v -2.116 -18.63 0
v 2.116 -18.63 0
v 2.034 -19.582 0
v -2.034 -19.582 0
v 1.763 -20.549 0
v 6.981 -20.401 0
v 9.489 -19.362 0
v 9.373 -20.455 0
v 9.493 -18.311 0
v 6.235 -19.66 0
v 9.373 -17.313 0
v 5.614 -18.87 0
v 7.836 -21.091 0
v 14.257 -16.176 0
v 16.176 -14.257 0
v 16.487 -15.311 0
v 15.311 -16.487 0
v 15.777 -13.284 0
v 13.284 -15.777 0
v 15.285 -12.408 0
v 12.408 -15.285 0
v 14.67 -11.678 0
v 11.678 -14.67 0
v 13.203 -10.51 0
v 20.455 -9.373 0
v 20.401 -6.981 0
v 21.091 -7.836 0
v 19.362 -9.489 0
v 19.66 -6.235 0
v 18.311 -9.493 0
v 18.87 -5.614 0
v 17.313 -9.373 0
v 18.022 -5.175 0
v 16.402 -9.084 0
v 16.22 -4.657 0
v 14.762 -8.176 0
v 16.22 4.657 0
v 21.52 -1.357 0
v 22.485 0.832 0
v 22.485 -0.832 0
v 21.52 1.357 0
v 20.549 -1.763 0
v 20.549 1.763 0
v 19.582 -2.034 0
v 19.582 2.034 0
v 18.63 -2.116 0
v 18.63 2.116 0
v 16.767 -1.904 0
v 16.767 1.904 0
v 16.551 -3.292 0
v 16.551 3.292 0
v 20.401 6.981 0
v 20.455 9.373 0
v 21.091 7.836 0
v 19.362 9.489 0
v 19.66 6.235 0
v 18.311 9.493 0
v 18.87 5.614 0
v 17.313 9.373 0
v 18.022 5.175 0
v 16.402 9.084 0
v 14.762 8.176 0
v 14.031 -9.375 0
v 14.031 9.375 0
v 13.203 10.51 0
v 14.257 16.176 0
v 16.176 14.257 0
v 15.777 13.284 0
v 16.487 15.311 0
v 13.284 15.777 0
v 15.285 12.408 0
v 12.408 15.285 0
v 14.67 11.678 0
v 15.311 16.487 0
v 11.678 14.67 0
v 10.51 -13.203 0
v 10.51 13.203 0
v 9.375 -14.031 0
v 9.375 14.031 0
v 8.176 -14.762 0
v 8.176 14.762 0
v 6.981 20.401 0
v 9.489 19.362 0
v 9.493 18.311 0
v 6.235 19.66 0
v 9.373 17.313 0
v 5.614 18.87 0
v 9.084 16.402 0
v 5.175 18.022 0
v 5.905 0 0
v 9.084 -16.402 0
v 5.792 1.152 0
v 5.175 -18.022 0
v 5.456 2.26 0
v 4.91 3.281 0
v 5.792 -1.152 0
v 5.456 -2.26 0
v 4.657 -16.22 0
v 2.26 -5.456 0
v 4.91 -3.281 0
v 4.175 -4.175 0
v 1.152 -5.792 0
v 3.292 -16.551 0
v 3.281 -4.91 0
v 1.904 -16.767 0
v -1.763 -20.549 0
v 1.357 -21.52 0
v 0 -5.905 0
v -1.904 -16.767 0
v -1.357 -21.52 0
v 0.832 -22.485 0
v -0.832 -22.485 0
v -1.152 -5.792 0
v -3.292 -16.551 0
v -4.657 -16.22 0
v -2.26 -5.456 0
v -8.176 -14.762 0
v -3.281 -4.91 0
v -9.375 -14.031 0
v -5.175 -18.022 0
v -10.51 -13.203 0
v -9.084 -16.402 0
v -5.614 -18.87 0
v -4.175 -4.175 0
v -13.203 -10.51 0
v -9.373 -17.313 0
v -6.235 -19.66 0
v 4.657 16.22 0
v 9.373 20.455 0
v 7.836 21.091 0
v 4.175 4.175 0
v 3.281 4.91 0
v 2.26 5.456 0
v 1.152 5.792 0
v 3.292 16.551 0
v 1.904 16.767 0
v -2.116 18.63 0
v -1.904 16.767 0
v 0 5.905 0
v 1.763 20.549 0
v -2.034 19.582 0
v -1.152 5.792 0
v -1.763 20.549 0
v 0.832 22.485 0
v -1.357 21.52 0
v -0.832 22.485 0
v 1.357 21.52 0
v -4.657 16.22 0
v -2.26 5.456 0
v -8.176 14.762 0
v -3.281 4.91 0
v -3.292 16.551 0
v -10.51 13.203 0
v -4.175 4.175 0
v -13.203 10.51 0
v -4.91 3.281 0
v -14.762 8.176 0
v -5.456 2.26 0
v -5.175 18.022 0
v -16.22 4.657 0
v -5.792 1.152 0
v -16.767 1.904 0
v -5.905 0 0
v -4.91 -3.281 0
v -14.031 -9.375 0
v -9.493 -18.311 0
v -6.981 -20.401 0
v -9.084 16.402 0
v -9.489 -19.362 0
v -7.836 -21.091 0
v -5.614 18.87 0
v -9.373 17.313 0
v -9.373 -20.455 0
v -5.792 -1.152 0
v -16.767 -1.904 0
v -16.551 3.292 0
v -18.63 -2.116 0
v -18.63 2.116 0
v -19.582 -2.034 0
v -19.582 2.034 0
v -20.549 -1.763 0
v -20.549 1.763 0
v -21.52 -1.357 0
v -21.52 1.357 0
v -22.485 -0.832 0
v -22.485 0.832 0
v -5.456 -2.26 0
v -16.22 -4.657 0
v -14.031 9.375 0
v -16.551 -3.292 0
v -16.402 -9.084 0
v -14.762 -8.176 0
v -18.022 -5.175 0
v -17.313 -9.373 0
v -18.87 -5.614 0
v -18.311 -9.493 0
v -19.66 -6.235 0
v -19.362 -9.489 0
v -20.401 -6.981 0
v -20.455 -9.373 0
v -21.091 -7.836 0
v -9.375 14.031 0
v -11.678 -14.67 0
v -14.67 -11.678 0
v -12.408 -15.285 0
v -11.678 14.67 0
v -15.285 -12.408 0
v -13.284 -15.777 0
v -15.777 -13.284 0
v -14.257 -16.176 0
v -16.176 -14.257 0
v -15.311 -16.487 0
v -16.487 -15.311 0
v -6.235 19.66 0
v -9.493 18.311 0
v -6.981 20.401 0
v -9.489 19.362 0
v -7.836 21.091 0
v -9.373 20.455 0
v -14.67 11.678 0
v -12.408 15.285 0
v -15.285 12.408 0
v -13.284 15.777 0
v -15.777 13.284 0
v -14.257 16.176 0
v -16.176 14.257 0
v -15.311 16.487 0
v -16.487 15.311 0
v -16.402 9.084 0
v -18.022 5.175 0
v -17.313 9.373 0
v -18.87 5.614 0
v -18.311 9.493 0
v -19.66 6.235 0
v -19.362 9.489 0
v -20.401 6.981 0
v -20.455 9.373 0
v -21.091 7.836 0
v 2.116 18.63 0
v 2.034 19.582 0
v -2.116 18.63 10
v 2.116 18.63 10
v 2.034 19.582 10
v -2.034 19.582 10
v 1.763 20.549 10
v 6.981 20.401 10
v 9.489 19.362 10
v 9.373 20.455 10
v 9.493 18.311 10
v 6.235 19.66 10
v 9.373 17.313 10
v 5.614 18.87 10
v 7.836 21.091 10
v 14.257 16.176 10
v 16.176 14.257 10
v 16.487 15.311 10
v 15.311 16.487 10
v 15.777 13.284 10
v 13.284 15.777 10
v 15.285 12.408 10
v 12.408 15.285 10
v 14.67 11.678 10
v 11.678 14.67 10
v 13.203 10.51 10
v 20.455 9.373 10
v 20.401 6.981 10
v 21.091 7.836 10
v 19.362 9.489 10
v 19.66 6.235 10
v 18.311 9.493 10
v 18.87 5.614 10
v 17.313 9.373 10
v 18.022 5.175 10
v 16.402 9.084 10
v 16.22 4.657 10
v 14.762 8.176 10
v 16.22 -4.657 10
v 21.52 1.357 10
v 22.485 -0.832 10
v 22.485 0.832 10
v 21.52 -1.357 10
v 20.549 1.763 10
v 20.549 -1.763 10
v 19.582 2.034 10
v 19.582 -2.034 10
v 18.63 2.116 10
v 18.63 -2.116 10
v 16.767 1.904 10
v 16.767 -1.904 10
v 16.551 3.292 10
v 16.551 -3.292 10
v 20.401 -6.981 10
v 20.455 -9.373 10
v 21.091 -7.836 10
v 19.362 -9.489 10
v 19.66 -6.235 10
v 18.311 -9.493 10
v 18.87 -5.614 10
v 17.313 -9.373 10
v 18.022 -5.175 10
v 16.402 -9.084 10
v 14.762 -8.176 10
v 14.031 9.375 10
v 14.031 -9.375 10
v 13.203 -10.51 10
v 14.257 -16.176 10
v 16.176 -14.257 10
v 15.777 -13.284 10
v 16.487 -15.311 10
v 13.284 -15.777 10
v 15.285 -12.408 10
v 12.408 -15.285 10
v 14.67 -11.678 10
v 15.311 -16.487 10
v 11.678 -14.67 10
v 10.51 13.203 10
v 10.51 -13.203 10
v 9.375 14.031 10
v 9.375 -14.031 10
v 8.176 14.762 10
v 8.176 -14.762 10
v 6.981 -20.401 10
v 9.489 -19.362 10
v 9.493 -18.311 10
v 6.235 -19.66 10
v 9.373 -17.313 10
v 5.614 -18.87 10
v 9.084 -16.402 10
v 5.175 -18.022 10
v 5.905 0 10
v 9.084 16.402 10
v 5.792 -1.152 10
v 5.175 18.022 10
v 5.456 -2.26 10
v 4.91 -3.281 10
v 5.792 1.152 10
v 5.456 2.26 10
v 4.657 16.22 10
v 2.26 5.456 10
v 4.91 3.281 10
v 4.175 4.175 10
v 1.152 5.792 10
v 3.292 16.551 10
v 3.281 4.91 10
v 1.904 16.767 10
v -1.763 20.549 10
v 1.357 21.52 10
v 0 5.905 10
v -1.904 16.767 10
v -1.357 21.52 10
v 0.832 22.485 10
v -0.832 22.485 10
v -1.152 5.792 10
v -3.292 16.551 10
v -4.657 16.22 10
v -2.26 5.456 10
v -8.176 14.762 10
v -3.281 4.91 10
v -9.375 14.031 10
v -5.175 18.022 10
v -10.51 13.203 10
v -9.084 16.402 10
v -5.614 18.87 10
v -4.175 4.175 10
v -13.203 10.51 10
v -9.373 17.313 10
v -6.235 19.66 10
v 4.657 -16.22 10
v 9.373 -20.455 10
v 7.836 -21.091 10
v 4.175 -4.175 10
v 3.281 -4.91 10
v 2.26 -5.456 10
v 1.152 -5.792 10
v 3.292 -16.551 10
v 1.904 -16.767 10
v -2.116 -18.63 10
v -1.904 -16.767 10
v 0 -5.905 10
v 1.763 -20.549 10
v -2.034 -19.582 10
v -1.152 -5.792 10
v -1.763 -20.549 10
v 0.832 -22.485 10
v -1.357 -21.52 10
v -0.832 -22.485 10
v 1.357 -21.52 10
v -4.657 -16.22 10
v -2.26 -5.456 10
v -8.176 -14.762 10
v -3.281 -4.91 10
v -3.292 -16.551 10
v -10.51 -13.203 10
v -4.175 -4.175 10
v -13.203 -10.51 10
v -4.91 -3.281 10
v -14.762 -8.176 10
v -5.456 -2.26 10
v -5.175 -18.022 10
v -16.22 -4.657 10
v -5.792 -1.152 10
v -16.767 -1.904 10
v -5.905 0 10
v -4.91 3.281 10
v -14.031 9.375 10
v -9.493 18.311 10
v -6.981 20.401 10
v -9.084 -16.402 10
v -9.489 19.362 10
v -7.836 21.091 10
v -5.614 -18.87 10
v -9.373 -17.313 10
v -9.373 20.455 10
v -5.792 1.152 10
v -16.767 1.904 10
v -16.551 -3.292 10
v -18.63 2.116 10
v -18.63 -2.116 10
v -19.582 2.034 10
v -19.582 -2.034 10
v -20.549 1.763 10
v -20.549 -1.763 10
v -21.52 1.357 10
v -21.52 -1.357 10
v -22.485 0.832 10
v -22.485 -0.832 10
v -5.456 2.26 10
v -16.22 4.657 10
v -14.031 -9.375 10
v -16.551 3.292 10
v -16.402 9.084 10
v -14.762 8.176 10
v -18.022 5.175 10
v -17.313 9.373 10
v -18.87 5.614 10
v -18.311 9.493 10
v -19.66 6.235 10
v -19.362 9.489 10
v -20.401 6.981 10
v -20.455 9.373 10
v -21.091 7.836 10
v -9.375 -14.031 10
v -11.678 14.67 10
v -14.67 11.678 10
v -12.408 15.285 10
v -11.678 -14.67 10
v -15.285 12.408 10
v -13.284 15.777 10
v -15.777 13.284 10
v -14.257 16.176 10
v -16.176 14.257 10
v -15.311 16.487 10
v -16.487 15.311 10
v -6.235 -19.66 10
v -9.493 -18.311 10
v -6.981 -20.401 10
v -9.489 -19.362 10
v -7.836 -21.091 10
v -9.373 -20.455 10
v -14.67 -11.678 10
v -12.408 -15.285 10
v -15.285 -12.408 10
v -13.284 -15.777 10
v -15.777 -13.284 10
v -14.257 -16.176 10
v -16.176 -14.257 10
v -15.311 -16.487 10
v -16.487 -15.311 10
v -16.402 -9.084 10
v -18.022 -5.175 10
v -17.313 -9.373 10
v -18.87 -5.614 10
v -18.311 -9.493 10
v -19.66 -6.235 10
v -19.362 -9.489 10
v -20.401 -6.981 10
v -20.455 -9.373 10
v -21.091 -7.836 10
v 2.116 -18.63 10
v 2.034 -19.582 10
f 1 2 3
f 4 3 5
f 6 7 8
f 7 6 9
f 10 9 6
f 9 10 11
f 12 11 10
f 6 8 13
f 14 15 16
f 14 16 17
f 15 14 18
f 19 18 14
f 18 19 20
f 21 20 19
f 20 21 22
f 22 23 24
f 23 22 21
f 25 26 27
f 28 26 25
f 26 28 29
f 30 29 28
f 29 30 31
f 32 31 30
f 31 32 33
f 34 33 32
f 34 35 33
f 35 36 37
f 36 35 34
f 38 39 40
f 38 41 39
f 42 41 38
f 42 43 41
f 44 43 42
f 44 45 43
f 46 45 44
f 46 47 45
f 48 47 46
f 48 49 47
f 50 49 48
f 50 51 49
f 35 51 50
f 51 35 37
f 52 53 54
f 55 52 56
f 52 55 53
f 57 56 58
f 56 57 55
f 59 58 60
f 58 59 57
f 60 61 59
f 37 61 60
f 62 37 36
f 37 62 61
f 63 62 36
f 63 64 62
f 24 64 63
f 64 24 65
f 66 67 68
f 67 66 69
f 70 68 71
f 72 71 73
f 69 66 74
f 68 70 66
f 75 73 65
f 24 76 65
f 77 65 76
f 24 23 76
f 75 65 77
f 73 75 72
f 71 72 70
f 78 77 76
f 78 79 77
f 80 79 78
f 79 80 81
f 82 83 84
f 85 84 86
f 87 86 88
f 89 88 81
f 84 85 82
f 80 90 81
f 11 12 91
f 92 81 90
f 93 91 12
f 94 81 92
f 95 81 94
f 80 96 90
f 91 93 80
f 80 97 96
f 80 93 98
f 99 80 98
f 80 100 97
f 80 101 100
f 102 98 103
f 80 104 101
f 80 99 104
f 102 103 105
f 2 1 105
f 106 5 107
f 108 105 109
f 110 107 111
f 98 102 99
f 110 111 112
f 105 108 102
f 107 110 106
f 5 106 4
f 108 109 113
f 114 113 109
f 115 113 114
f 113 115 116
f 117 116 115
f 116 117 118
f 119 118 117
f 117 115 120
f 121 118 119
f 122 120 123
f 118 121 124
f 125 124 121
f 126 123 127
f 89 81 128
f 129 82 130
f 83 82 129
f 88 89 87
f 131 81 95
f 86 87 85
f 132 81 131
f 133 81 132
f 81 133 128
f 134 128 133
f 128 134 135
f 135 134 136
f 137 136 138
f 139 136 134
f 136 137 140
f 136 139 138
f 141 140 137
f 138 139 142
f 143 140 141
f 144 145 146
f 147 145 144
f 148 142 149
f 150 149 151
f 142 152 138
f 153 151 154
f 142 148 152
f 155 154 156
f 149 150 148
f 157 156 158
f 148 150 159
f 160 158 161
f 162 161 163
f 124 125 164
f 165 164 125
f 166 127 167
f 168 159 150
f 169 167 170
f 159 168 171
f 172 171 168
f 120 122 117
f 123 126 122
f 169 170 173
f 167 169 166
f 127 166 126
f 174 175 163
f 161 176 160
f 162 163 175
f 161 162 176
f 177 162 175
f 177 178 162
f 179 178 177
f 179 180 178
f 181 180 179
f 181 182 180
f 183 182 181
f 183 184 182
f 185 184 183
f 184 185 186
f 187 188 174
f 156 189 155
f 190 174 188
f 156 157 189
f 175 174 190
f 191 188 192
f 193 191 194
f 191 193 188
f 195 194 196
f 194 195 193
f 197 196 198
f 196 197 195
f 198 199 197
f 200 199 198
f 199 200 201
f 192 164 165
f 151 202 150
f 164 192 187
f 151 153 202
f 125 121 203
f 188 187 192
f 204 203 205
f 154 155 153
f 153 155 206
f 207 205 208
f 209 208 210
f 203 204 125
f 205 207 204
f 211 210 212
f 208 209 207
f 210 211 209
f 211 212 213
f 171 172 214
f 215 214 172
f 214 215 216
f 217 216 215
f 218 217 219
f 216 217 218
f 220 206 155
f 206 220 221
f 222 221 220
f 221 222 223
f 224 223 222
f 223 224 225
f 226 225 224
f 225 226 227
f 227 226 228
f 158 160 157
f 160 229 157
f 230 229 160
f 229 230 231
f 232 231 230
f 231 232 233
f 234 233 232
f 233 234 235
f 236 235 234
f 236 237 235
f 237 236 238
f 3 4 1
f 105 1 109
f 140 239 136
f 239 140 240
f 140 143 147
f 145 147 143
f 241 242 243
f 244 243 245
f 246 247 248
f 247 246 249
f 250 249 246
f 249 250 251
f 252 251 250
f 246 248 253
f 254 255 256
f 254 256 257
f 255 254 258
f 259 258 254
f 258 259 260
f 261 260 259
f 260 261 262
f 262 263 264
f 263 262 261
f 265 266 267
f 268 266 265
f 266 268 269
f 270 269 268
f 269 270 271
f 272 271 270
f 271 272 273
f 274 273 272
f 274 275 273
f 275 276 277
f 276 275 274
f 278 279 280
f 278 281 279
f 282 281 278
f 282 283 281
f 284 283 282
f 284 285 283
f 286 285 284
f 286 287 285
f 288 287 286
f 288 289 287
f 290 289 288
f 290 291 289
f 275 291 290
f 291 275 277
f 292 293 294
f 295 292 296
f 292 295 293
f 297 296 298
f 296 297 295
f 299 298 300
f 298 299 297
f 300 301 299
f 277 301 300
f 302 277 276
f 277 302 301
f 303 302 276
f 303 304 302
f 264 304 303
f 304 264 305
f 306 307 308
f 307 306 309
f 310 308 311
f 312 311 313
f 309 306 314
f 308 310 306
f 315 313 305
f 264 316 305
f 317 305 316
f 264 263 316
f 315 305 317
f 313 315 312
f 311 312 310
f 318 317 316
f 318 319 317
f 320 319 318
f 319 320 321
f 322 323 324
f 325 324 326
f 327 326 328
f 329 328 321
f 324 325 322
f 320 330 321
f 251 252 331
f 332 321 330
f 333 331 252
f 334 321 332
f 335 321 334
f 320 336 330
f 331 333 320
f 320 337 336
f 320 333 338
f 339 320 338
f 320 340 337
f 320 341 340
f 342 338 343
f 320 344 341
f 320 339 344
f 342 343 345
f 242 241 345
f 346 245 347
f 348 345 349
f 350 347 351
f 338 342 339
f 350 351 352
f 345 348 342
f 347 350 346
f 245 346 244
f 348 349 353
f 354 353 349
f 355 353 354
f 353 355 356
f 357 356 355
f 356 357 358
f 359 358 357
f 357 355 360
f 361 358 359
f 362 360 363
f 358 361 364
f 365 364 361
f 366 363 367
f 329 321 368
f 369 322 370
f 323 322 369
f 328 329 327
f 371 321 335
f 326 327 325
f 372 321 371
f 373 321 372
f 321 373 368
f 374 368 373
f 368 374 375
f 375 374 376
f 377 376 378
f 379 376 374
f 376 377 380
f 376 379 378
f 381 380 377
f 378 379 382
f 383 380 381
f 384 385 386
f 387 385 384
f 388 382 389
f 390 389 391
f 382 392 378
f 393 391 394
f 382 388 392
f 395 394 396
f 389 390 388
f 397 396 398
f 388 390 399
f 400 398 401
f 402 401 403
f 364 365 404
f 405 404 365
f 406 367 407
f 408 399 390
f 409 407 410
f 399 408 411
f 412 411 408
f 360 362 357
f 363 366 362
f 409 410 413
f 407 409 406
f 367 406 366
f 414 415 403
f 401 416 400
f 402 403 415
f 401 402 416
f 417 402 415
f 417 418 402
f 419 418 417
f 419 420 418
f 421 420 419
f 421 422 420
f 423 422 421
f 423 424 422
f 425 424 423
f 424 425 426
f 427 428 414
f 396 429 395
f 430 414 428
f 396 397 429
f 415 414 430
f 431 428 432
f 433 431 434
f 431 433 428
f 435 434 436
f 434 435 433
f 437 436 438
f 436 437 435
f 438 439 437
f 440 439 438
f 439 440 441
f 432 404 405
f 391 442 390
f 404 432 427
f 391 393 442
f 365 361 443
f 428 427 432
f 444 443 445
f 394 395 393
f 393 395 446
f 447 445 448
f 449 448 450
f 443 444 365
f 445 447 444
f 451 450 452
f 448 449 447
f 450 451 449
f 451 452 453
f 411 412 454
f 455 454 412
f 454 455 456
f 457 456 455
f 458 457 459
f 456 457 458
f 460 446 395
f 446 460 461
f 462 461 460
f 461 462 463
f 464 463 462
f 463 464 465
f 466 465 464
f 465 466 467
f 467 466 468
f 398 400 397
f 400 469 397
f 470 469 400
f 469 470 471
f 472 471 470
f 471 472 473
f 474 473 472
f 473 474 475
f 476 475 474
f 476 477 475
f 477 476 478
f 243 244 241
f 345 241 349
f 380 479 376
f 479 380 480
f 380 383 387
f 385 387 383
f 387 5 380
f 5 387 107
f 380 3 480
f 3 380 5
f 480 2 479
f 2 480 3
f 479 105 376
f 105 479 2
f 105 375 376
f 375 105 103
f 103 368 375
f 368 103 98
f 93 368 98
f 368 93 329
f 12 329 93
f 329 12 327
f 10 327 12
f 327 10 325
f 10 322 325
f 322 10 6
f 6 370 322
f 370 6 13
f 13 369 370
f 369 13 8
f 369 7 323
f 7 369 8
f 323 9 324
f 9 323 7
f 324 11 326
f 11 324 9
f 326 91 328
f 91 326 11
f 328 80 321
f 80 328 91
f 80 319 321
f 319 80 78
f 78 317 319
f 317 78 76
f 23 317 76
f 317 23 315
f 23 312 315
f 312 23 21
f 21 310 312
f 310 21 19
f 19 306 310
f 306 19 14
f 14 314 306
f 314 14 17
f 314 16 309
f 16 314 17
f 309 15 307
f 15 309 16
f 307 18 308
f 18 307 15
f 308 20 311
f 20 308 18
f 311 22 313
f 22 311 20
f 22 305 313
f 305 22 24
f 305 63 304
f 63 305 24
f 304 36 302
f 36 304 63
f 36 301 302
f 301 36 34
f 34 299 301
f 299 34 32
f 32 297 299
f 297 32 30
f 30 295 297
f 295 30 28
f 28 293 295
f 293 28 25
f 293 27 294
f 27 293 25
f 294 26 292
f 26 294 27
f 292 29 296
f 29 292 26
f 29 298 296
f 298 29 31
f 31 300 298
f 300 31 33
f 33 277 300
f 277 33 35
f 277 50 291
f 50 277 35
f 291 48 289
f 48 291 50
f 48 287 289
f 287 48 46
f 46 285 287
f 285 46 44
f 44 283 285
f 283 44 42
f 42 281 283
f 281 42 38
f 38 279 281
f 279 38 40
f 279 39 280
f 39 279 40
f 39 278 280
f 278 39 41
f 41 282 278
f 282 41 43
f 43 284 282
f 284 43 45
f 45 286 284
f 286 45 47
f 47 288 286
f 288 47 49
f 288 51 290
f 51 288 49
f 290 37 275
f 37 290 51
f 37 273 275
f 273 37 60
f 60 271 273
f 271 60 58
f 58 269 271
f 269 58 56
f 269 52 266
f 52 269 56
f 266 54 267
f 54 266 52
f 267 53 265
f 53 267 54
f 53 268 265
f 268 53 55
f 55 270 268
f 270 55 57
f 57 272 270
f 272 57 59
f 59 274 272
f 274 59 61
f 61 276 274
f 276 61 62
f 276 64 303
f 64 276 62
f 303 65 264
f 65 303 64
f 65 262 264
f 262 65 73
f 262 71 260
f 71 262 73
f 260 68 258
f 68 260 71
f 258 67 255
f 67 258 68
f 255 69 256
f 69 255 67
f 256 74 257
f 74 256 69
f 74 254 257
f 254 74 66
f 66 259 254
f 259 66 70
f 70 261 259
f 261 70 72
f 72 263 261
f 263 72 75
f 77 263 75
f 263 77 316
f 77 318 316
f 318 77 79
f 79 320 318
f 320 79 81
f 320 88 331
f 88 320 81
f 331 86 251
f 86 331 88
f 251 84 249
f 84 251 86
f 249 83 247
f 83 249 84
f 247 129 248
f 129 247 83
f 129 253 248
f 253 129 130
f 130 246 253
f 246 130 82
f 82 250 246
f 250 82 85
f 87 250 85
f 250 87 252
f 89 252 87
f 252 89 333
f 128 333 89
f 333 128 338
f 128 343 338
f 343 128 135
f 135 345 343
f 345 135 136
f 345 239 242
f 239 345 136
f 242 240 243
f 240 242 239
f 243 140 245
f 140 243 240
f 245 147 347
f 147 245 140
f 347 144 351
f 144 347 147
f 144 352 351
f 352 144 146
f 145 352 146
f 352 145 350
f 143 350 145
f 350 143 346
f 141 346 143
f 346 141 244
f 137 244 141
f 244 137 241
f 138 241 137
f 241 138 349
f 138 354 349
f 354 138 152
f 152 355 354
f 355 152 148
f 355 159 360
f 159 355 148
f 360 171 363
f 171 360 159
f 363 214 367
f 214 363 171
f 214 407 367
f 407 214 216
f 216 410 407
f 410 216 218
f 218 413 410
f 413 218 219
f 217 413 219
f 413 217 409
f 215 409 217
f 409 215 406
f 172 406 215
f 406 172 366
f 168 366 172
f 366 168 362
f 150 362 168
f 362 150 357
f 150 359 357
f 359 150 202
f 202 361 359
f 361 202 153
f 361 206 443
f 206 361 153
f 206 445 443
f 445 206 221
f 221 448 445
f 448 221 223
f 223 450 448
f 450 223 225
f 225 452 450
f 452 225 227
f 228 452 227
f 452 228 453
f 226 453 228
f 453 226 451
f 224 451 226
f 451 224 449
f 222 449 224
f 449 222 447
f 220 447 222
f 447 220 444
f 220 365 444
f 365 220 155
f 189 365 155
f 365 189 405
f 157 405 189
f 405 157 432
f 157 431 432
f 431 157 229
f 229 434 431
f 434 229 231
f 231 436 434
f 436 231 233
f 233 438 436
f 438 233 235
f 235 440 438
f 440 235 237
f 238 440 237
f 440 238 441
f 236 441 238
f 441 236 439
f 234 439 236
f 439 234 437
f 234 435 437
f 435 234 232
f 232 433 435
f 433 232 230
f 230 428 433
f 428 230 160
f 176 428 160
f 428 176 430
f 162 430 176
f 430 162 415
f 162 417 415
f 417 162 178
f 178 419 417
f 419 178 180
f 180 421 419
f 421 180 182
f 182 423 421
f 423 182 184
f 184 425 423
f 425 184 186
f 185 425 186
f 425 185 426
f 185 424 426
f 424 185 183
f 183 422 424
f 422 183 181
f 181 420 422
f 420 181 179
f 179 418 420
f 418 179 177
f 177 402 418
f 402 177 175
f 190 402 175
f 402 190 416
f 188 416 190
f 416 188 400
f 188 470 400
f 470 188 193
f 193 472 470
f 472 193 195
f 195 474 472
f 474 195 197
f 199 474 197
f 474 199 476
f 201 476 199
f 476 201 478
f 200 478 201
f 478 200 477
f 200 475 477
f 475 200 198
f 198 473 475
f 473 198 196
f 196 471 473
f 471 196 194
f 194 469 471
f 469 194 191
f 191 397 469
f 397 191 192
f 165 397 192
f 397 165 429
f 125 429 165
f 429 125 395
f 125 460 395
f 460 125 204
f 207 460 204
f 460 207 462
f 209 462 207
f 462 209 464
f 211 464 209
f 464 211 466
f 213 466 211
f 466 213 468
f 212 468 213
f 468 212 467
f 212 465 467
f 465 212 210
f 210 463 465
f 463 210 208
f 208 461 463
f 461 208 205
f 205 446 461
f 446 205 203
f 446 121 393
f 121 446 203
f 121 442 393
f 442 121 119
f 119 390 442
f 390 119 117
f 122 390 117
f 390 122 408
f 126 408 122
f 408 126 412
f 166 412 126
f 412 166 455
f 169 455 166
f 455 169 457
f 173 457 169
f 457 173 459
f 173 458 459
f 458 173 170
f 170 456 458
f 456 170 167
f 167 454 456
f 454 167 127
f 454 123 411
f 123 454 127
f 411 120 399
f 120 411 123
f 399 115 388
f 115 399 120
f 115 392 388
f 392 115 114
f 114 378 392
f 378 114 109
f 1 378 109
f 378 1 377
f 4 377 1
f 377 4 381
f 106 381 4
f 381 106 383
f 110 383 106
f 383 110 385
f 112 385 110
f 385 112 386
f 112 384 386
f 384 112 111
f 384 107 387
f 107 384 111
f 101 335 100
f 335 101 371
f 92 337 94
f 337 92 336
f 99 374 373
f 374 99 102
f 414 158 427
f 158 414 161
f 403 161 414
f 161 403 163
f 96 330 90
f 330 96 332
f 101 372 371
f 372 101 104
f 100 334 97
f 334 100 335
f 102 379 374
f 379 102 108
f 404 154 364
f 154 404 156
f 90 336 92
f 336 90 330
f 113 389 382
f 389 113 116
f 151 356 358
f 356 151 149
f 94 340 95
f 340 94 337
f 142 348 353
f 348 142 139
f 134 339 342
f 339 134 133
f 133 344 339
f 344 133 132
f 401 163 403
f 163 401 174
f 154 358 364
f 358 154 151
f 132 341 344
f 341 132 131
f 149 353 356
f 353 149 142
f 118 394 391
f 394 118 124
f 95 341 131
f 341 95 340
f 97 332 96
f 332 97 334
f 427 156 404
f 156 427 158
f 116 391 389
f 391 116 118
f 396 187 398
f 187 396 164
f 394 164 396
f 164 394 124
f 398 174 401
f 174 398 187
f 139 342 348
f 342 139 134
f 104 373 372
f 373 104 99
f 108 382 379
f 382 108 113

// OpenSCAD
$fn = 32;

// ----------------------------------------------------------------------
// Spur gear: m=2.5 z=16, 45 mm tip diameter x 10 mm
// ----------------------------------------------------------------------

// --- parameters (mm) ---
modul = 2.5;              // module
n_teeth = 16;             // number of teeth
width = 10;               // face width
pa = 20;                  // pressure angle, deg
shaft_d = 11.81;          // shaft bore

/* --- involute profile --- */
pitch_r = modul * n_teeth / 2;
base_r = pitch_r * cos(pa);
tip_r = pitch_r + modul;
root_r = pitch_r - 1.25 * modul;
flank_steps = 6;

function inv_deg(a) = (tan(a) - a * PI / 180) * 180 / PI;
function flank_r(i) = root_r + (tip_r - root_r) * i / flank_steps;
function half_angle(r) = 90 / n_teeth + inv_deg(pa) - inv_deg(acos(min(1, base_r / r)));
function tooth_pt(k, i, side) =
    let (r = flank_r(i), a = k * 360 / n_teeth + side * half_angle(r))
    [r * cos(a), r * sin(a)];

module tooth_profile() {
  polygon(points = [
    for (k = [0 : n_teeth - 1])
      each [
        for (i = [0 : flank_steps]) tooth_pt(k, i, -1),
        for (i = [flank_steps : -1 : 0]) tooth_pt(k, i, 1),
        let (ta = (k + 0.5) * 360 / n_teeth)
          [root_r * cos(ta), root_r * sin(ta)]
      ]
  ]);
}

module gear_disc() {
  linear_extrude(height = width) tooth_profile();
}

difference() {
  gear_disc();
  translate([0, 0, -1]) cylinder(h = width + 3, d = shaft_d);
}
